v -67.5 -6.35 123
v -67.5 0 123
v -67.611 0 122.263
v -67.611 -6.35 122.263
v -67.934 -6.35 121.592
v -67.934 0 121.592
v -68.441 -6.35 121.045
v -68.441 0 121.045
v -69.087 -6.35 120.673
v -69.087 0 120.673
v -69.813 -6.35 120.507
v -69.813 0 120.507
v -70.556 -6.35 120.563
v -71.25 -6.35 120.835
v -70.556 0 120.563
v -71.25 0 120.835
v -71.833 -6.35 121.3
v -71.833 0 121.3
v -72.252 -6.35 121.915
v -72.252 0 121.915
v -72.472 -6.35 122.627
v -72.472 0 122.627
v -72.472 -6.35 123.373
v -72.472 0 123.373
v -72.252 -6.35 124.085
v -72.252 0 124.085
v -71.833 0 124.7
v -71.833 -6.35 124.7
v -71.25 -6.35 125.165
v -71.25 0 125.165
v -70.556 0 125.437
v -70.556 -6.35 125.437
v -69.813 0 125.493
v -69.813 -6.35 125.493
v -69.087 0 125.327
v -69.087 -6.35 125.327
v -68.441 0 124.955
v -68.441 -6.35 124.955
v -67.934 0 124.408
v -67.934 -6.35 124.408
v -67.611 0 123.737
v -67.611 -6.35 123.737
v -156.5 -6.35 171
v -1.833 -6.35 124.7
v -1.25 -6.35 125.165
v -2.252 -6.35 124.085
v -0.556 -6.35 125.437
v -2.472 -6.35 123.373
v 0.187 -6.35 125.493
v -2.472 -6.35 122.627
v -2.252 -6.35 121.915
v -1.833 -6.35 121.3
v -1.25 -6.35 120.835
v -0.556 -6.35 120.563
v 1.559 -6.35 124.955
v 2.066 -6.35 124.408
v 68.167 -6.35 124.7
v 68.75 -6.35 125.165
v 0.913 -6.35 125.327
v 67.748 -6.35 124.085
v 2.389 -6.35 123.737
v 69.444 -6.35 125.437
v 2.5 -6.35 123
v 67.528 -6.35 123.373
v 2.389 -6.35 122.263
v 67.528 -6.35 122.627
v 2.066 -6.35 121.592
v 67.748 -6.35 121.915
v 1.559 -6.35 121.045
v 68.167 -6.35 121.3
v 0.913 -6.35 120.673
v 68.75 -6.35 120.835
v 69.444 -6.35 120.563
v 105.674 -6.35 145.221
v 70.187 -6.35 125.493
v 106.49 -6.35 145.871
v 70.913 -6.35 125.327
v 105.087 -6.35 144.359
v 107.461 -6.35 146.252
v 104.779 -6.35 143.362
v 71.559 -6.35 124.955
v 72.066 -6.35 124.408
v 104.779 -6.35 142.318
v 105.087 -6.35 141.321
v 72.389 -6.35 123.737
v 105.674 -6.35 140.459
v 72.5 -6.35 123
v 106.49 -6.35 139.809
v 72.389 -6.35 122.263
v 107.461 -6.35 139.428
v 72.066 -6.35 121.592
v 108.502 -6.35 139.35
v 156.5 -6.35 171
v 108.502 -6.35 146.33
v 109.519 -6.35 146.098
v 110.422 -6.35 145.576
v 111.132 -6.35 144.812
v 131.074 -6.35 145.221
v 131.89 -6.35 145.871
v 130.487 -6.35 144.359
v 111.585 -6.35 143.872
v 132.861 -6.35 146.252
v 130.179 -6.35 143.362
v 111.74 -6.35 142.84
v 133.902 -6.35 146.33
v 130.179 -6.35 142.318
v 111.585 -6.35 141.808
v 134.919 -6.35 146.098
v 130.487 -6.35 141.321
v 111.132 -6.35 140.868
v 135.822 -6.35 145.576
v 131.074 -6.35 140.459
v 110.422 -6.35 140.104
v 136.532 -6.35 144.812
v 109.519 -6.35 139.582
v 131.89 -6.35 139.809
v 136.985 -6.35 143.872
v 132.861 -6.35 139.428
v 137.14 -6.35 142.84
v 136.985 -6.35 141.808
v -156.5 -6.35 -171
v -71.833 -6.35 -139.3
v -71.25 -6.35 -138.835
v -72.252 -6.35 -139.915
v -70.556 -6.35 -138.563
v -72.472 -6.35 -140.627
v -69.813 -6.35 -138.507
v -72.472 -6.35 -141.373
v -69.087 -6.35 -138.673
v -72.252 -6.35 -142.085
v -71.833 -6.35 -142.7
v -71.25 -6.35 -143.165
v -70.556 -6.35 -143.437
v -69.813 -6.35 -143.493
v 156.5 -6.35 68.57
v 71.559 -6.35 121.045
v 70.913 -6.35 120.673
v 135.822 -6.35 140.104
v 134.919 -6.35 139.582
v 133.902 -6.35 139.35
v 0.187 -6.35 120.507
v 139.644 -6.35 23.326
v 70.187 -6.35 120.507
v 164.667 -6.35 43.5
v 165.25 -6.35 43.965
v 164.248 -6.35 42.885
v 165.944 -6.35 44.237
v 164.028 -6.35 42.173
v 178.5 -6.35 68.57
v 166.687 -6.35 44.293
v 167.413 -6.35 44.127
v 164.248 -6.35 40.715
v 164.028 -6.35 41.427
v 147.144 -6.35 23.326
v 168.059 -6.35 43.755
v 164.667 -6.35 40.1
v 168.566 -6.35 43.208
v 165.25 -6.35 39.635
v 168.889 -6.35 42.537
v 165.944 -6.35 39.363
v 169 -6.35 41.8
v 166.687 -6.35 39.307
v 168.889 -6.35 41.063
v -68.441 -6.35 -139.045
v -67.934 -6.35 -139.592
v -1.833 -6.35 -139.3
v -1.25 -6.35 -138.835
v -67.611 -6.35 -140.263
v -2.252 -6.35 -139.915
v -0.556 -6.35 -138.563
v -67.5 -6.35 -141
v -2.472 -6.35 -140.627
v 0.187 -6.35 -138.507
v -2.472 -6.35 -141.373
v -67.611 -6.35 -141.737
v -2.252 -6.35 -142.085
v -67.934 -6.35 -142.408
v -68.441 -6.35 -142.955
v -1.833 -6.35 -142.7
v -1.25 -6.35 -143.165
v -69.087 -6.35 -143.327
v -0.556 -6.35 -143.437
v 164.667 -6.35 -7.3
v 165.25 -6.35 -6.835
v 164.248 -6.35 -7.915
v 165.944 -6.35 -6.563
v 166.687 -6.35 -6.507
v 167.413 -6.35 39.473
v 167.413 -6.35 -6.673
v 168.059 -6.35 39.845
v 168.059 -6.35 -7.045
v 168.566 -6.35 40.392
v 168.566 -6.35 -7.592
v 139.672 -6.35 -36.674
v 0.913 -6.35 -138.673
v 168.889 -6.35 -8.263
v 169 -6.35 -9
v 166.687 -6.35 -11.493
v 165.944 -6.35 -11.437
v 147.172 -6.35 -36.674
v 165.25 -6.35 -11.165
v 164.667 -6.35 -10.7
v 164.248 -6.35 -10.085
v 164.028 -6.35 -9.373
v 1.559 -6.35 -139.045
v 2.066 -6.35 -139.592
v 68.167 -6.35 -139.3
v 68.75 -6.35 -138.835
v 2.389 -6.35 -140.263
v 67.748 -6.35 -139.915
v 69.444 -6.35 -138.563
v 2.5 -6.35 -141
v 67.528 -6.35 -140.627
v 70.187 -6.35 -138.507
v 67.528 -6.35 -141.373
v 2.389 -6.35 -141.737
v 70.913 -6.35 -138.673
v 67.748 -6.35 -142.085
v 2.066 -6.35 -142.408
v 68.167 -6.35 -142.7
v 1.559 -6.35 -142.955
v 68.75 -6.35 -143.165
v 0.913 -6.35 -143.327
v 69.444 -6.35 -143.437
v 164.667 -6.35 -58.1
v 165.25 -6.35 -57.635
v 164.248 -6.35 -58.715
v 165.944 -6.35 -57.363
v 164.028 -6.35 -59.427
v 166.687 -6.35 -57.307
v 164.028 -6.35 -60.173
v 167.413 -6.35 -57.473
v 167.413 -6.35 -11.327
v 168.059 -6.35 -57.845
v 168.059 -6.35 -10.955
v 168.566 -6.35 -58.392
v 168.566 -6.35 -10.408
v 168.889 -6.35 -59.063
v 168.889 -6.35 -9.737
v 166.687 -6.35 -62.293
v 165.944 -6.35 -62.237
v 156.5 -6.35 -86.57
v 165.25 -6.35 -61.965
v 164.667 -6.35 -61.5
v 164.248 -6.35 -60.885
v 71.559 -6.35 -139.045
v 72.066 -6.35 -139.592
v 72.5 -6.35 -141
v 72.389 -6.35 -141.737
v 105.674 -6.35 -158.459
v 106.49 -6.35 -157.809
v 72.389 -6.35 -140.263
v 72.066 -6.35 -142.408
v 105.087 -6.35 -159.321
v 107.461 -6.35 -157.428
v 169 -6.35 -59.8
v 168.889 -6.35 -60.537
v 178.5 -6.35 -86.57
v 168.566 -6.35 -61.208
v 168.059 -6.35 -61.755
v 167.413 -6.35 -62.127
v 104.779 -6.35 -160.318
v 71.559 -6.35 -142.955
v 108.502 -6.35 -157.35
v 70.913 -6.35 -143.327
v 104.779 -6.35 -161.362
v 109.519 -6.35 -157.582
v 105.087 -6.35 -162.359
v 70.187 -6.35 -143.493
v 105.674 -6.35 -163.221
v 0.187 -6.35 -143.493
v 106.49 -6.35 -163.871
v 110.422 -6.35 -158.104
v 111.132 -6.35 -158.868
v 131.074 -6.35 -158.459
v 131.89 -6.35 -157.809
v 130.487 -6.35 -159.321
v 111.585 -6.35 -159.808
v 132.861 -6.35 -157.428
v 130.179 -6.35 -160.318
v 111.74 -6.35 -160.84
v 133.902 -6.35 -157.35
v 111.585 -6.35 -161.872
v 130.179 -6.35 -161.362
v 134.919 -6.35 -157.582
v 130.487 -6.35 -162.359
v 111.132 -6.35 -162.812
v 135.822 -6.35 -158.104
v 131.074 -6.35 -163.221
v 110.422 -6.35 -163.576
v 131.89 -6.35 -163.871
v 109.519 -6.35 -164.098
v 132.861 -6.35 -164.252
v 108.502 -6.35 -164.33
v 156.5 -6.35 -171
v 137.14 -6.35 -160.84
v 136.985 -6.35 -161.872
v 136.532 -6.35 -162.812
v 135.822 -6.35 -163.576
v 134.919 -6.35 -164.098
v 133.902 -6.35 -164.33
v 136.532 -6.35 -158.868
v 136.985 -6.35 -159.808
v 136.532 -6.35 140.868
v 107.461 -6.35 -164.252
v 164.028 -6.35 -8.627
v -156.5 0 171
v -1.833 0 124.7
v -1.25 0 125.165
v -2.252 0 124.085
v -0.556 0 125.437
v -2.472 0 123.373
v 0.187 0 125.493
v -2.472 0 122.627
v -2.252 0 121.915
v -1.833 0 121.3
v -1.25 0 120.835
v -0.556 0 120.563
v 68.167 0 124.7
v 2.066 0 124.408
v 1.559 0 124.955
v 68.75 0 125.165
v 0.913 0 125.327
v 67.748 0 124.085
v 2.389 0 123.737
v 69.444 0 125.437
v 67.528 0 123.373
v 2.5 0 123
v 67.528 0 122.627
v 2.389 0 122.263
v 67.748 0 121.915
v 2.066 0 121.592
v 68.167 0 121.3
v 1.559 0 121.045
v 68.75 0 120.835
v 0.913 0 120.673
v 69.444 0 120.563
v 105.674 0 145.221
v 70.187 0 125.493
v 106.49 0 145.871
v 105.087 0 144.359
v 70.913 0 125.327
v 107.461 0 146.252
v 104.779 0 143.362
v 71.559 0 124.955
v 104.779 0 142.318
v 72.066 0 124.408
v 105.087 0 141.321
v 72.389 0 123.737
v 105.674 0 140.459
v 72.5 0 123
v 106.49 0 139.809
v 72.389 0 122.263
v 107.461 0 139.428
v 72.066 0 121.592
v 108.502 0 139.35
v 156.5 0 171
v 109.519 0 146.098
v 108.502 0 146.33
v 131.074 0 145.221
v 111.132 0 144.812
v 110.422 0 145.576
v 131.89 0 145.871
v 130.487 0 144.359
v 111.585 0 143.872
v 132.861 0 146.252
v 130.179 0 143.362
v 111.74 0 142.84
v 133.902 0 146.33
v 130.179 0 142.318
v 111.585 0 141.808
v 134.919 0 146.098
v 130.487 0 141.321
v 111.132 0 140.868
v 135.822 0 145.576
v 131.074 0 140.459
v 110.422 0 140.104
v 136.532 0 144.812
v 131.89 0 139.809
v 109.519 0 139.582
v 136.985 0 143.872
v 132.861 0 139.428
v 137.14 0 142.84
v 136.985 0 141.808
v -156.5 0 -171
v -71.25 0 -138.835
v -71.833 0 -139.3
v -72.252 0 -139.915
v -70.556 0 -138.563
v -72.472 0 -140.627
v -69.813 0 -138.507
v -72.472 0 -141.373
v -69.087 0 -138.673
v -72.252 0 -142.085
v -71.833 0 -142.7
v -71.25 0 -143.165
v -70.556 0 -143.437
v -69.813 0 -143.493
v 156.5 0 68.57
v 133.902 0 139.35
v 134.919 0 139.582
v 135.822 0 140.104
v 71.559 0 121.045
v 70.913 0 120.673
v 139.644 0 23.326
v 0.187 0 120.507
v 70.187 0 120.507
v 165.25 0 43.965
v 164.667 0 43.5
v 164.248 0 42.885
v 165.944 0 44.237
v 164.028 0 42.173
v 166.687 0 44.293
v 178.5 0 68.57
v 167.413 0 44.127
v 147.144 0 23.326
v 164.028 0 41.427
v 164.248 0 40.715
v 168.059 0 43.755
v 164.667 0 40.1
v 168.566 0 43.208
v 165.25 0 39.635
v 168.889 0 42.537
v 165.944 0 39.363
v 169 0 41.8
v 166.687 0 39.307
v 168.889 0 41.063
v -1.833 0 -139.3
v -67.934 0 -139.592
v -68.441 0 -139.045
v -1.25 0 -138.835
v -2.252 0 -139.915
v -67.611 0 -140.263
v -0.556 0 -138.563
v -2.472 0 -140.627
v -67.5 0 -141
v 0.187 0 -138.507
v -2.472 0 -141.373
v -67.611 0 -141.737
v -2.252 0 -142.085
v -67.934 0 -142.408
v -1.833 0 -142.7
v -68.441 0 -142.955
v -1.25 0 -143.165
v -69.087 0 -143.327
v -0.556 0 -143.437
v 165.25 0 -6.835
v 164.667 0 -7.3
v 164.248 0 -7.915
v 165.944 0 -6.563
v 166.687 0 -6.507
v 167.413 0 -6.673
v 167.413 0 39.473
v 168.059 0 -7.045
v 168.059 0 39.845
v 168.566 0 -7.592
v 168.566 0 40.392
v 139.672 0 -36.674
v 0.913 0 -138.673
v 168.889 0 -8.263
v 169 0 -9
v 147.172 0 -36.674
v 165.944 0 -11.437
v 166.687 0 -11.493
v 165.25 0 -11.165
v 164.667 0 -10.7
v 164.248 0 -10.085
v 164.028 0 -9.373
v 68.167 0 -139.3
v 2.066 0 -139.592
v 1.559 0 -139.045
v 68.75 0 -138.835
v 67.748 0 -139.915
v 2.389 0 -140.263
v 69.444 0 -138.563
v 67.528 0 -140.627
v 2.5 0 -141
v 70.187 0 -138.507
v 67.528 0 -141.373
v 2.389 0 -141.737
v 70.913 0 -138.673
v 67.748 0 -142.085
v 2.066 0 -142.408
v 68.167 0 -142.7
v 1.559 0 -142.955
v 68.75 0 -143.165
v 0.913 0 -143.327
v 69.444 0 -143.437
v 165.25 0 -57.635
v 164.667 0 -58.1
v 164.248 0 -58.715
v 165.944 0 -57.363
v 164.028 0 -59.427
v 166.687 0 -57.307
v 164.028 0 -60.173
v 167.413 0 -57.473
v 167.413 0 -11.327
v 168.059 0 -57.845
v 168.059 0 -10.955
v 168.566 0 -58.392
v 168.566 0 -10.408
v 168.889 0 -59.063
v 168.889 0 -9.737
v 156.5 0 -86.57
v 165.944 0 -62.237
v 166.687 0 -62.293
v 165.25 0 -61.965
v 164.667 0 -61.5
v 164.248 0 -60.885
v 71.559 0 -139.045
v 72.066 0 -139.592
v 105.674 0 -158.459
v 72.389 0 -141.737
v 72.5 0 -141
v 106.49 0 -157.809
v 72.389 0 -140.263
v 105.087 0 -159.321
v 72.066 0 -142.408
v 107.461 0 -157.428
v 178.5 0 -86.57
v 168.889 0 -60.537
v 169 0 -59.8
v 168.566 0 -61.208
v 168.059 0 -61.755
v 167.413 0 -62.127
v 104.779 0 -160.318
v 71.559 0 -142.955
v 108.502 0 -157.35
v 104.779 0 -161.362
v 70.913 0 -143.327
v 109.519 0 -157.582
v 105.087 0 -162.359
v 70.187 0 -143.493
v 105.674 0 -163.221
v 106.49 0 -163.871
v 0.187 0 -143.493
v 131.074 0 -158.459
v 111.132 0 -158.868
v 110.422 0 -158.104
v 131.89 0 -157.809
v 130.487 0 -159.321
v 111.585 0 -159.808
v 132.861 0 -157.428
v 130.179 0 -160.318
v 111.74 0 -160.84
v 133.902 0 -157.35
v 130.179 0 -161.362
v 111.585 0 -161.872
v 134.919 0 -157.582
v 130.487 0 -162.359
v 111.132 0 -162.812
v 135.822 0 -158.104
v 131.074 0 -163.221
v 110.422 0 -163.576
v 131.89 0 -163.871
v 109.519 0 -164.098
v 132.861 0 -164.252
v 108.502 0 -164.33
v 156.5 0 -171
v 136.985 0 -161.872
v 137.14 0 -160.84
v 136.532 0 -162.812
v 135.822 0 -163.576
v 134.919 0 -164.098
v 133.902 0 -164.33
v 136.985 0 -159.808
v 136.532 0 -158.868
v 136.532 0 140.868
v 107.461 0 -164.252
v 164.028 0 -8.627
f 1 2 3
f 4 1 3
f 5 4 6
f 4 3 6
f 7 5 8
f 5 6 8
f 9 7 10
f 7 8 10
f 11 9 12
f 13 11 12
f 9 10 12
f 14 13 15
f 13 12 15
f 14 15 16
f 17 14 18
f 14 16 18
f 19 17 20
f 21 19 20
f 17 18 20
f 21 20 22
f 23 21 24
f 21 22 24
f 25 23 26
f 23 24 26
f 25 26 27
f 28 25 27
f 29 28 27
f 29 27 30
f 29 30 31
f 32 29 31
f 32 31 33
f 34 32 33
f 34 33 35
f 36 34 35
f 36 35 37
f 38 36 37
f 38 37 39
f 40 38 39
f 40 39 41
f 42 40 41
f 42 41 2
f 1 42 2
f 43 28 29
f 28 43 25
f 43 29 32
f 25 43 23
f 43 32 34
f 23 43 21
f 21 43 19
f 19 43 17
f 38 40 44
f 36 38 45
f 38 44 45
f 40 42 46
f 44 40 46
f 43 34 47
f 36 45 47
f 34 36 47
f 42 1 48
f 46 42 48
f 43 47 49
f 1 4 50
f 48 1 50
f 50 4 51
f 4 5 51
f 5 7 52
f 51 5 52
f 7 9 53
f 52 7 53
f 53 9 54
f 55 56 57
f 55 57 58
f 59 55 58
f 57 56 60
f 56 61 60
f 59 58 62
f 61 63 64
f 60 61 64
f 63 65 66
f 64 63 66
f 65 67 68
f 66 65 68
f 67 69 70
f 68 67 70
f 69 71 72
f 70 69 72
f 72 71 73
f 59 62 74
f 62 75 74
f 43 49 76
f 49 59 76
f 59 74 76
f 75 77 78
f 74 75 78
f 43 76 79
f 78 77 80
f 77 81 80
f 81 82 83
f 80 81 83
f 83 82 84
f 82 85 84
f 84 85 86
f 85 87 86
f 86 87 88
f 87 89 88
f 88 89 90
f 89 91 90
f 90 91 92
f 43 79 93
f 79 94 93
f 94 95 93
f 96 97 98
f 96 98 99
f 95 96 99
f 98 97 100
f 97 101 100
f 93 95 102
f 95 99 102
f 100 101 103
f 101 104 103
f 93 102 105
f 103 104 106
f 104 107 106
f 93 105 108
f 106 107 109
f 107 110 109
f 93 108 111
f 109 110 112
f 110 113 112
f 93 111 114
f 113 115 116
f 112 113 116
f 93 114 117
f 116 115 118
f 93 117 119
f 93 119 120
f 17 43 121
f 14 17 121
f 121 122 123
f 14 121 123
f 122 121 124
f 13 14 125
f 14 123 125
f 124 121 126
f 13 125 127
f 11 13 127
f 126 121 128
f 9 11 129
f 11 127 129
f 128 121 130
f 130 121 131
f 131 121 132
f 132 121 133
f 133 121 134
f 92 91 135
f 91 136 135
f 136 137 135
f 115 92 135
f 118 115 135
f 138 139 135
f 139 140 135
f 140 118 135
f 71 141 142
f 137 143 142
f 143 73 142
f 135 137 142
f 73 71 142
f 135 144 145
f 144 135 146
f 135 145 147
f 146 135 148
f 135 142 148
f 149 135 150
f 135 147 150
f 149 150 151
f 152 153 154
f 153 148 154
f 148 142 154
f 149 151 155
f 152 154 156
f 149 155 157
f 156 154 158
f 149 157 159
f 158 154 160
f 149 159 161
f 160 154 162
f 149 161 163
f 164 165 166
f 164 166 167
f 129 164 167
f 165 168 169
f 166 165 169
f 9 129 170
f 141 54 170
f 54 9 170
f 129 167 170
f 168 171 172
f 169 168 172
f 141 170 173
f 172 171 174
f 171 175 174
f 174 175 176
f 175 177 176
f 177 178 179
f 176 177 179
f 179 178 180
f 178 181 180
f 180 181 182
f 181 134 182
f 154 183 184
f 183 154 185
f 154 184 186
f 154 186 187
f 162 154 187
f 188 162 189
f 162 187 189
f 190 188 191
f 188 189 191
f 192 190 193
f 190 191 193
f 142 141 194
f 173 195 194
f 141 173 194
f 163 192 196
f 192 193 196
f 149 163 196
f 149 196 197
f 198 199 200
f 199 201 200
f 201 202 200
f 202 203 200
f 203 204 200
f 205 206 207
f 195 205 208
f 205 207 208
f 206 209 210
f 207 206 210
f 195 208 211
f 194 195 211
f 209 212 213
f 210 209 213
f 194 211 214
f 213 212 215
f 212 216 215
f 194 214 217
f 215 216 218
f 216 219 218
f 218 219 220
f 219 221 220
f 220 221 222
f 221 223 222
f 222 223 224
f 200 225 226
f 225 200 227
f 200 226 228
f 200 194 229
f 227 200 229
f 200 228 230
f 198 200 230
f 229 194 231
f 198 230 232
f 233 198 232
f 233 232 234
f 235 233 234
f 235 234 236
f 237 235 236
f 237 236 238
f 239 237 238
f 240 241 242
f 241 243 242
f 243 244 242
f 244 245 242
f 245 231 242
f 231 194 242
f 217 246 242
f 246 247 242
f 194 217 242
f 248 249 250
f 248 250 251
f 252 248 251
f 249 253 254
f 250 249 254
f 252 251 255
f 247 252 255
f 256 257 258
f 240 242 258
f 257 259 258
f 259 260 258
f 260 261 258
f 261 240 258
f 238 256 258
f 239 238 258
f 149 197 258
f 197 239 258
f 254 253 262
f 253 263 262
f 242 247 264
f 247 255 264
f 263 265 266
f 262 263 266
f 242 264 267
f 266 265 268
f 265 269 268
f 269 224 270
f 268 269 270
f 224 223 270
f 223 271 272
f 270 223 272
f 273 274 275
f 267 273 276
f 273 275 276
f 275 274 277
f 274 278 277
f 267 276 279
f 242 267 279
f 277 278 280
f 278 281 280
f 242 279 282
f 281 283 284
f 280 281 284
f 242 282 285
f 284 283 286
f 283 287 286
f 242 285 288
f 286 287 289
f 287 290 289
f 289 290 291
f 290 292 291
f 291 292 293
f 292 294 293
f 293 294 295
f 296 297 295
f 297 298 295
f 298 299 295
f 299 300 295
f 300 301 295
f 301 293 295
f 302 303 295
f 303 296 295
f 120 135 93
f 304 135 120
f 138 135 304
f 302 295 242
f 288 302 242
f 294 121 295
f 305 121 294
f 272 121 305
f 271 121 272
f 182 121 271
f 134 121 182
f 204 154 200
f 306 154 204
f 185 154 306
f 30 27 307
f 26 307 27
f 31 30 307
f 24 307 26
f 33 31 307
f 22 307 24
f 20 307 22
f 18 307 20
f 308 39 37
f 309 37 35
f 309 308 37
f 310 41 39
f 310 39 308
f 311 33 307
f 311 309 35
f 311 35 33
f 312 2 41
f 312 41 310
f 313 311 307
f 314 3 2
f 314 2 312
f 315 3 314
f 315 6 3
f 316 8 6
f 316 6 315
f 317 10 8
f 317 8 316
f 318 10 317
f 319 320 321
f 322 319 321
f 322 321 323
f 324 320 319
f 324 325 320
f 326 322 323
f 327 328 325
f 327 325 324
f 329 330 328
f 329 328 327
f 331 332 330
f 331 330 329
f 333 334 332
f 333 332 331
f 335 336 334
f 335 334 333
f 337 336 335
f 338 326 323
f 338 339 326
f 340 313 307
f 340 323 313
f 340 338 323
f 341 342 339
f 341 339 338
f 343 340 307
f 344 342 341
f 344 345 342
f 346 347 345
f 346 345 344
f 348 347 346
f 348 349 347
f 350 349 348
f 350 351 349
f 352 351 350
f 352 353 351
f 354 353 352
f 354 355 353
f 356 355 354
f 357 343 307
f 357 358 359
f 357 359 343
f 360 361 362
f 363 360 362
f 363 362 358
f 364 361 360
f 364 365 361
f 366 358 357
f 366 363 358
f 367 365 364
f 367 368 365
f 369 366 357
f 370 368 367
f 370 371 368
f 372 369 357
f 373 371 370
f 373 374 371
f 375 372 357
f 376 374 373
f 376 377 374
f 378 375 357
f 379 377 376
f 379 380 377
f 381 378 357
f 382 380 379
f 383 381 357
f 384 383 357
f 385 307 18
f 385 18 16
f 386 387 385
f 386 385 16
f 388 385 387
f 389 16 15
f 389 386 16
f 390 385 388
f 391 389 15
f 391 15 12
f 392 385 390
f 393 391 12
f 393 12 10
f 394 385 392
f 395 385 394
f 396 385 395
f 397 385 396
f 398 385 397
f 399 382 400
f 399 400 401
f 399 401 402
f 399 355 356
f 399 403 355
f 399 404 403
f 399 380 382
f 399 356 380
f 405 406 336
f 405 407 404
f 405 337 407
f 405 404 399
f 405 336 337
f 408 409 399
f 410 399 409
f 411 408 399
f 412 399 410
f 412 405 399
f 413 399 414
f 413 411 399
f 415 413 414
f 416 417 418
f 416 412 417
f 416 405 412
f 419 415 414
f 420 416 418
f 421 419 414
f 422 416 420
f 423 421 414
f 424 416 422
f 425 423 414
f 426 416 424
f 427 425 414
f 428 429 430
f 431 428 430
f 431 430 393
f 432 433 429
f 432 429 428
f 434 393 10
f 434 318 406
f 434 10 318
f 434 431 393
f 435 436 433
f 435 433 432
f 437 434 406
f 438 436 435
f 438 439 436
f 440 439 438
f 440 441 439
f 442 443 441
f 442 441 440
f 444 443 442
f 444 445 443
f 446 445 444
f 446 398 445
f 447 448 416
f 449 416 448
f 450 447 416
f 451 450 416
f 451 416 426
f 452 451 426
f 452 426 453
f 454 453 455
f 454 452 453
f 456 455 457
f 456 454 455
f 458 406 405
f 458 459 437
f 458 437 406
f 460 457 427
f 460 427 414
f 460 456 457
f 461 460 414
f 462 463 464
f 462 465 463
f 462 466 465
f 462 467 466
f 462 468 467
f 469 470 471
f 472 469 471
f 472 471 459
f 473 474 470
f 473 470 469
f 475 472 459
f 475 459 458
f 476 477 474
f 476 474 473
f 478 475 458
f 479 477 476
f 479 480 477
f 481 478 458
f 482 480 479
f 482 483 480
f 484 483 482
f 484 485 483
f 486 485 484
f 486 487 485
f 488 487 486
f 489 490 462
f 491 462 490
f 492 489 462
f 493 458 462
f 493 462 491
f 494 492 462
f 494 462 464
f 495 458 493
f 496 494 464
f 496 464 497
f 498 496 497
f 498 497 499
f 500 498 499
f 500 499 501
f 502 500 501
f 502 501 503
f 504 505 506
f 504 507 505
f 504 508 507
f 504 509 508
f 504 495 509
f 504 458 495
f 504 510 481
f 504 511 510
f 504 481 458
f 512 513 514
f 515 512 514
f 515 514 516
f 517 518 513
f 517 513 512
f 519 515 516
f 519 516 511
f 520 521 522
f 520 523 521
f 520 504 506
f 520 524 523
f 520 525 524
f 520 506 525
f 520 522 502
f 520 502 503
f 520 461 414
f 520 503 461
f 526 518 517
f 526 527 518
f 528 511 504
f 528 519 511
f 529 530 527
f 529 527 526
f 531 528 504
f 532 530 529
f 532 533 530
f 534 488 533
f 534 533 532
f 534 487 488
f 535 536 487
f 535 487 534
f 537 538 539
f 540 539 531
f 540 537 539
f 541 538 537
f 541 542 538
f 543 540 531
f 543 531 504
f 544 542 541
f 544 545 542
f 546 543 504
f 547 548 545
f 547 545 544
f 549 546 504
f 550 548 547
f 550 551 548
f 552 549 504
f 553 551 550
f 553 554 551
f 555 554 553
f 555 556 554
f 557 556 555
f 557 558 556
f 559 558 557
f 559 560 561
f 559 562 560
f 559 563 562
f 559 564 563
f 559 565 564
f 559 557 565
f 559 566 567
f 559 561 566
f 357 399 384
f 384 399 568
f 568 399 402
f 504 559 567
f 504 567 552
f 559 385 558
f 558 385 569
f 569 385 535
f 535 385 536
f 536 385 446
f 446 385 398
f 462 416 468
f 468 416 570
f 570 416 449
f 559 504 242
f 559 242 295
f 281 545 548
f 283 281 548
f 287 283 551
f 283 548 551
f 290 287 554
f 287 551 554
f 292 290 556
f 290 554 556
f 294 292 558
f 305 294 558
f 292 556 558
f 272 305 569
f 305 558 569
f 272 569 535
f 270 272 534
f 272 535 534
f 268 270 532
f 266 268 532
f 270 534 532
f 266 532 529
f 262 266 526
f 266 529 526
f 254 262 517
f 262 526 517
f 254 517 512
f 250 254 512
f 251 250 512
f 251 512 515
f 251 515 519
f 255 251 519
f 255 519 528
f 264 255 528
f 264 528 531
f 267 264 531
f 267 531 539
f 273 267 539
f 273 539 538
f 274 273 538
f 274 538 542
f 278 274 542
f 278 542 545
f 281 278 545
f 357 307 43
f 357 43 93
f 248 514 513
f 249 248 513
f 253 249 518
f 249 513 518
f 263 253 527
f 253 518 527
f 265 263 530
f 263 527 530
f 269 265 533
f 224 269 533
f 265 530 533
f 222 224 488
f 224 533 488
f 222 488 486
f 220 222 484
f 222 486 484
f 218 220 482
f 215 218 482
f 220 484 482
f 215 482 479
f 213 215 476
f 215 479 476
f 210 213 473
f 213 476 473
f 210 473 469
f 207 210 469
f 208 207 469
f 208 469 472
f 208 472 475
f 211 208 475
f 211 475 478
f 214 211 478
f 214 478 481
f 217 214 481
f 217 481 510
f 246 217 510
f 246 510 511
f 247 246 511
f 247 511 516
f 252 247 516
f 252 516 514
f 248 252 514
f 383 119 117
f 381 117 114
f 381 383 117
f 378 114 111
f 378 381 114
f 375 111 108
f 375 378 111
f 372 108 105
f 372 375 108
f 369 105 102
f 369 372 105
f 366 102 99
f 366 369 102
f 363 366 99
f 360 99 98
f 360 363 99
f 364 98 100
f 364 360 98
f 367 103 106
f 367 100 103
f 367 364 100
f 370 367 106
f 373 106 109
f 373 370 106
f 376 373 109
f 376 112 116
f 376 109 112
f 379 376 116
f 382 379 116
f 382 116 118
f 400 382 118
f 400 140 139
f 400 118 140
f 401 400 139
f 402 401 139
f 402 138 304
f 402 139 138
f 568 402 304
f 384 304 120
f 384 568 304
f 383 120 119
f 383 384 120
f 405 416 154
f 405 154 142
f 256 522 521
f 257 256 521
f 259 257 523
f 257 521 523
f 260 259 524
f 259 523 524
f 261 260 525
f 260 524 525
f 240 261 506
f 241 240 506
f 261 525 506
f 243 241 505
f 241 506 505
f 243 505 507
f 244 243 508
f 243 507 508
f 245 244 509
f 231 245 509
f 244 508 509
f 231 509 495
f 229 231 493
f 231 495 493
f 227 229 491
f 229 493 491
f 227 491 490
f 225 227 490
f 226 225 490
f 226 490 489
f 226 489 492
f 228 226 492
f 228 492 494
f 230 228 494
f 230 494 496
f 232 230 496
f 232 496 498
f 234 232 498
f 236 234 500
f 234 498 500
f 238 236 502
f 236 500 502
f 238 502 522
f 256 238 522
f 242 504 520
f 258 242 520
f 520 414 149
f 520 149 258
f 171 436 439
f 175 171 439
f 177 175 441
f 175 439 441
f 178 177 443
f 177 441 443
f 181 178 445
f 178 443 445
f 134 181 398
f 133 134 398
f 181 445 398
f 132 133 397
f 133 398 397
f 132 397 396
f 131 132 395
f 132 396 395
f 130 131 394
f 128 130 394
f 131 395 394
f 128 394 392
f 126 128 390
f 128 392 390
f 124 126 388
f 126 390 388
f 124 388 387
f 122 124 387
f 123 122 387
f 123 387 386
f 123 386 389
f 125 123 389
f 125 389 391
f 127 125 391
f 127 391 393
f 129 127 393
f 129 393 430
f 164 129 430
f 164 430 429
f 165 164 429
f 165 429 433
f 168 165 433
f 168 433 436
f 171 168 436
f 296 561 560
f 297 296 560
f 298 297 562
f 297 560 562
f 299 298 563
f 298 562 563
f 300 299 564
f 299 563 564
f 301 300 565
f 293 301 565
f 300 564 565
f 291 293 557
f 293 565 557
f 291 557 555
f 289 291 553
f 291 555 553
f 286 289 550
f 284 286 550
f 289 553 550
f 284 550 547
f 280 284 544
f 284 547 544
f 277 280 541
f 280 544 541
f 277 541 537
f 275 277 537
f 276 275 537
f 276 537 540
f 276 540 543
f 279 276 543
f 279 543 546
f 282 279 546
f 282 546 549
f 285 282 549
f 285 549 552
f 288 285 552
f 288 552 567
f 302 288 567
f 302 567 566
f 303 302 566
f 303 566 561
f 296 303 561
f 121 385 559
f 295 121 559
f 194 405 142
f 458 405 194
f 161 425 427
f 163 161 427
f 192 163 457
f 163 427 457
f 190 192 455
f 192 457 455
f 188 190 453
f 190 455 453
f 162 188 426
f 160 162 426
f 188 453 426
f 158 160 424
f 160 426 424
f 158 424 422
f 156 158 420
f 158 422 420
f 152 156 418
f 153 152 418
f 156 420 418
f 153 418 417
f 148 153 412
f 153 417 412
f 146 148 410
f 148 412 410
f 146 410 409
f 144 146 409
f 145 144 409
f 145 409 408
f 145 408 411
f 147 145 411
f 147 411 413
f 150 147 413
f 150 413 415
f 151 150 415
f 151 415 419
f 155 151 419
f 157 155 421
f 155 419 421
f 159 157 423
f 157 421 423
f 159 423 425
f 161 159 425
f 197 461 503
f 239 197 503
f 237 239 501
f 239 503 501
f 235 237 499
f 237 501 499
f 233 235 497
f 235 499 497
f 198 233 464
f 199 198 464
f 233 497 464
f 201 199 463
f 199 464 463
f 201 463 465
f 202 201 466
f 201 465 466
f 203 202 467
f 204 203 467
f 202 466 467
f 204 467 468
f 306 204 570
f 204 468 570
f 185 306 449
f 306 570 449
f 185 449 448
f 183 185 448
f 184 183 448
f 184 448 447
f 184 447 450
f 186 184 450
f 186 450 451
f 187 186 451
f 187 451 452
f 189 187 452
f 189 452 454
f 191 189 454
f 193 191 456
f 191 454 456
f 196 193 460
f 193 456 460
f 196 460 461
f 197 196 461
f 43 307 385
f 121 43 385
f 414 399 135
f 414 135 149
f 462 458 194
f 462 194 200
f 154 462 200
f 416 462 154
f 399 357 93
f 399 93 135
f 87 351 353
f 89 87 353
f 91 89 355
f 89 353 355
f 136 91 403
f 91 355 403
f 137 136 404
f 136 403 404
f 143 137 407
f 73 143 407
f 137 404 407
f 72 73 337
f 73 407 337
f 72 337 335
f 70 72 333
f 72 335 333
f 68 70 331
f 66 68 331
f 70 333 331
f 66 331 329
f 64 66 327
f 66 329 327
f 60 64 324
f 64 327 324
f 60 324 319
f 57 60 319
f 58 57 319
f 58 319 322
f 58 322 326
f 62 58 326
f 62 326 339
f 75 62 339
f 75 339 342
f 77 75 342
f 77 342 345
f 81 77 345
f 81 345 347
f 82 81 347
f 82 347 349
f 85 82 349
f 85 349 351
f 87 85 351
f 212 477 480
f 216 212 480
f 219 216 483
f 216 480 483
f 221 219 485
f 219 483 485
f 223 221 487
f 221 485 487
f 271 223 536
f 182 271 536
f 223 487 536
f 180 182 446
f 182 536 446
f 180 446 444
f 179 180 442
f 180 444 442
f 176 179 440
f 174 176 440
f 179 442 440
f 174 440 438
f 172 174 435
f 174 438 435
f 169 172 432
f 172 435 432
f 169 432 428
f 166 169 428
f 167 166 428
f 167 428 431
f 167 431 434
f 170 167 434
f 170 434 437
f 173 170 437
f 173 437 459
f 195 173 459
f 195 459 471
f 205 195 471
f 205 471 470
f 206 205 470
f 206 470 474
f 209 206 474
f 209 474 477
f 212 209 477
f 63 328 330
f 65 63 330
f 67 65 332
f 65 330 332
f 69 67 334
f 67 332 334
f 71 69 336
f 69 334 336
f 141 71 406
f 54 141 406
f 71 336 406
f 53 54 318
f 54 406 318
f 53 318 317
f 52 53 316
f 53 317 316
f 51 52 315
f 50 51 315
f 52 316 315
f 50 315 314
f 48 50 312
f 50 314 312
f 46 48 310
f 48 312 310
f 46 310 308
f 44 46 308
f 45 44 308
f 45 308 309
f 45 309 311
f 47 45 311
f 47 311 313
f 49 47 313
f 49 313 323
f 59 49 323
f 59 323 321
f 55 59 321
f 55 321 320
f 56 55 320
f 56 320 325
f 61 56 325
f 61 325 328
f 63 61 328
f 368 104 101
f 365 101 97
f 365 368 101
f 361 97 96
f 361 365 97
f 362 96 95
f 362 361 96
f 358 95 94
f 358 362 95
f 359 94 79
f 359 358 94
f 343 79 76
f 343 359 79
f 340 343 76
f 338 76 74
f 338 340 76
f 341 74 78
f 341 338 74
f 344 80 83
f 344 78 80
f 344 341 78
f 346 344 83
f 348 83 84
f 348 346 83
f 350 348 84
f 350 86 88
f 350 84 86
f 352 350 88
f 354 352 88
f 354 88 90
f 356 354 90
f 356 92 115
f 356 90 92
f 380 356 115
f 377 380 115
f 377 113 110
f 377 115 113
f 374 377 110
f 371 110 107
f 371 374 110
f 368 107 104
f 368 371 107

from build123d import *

# Parameters (mm, degrees)
SKETCH1_W           = 313
SKETCH1_H           = 342
BOSS_EXTRUDE1_DEPTH = 6.35
SKETCH3_W           = 22
SKETCH3_H           = 155.14040353
SKETCH3_R           = 2.5
BOSS_EXTRUDE2_DEPTH = 6.35
SKETCH2_R           = 2.5
CUT_EXTRUDE1_DEPTH  = 7.35
SKETCH4_R           = 3.5
CUT_EXTRUDE2_DEPTH  = 7.35
CUT_EXTRUDE3_DEPTH  = 7.35


with BuildPart() as part:
    # Sketch1 → Boss-Extrude1 (new body)
    with BuildSketch(Plane(origin=(0, 0, 0), x_dir=(1, 0, 0), z_dir=(0, 1, 0))):
        Rectangle(SKETCH1_W, SKETCH1_H)
    extrude(amount=-BOSS_EXTRUDE1_DEPTH)

    # Sketch3 → Boss-Extrude2 (add)
    with BuildSketch(Plane(origin=(0, 0, 0), x_dir=(1, 0, 0), z_dir=(0, 1, 0))):
        with Locations((167.5, 9)):
            Rectangle(SKETCH3_W, SKETCH3_H)
        with Locations((166.5, 9)):
            Circle(SKETCH3_R, mode=Mode.SUBTRACT)
        with Locations((166.5, -41.8)):
            Circle(SKETCH3_R, mode=Mode.SUBTRACT)
        with Locations((166.5, 59.8)):
            Circle(SKETCH3_R, mode=Mode.SUBTRACT)
    extrude(amount=-BOSS_EXTRUDE2_DEPTH)

    # Sketch2 → Cut-Extrude1 (cut, through all)
    with BuildSketch(Plane(origin=(0, 0, 0), x_dir=(1, 0, 0), z_dir=(0, 1, 0))):
        with Locations((0, -123)):
            Circle(SKETCH2_R)
        with Locations((-70, -123)):
            Circle(SKETCH2_R)
        with Locations((70, -123)):
            Circle(SKETCH2_R)
        with Locations((-70, 141)):
            Circle(SKETCH2_R)
        with Locations((0, 141)):
            Circle(SKETCH2_R)
        with Locations((70, 141)):
            Circle(SKETCH2_R)
    extrude(amount=-CUT_EXTRUDE1_DEPTH, mode=Mode.SUBTRACT)

    # Sketch4 → Cut-Extrude2 (cut, through all)
    with BuildSketch(Plane(origin=(0, 0, 0), x_dir=(1, 0, 0), z_dir=(0, 1, 0))):
        with Locations((133.64, 160.84)):
            Circle(SKETCH4_R)
        with Locations((108.24, 160.84)):
            Circle(SKETCH4_R)
    cut_extrude2 = extrude(amount=-CUT_EXTRUDE2_DEPTH, mode=Mode.SUBTRACT)

    # Mirror1: Cut-Extrude2 across plane
    add(cut_extrude2.mirror(Plane(origin=(0, 0, -9), x_dir=(1, 0, 0), z_dir=(0, 0, -1))), mode=Mode.SUBTRACT)

    # Sketch5 → Cut-Extrude3 (cut, through all)
    with BuildSketch(Plane(origin=(0, 0, 0), x_dir=(1, 0, 0), z_dir=(0, 1, 0))):
        Polygon((139.671773243, 36.673783491), (147.171773243, 36.673783491), (147.143523721, -23.326216509), (139.643523721, -23.326216509), align=None)
    extrude(amount=-CUT_EXTRUDE3_DEPTH, mode=Mode.SUBTRACT)


solid = part.part
